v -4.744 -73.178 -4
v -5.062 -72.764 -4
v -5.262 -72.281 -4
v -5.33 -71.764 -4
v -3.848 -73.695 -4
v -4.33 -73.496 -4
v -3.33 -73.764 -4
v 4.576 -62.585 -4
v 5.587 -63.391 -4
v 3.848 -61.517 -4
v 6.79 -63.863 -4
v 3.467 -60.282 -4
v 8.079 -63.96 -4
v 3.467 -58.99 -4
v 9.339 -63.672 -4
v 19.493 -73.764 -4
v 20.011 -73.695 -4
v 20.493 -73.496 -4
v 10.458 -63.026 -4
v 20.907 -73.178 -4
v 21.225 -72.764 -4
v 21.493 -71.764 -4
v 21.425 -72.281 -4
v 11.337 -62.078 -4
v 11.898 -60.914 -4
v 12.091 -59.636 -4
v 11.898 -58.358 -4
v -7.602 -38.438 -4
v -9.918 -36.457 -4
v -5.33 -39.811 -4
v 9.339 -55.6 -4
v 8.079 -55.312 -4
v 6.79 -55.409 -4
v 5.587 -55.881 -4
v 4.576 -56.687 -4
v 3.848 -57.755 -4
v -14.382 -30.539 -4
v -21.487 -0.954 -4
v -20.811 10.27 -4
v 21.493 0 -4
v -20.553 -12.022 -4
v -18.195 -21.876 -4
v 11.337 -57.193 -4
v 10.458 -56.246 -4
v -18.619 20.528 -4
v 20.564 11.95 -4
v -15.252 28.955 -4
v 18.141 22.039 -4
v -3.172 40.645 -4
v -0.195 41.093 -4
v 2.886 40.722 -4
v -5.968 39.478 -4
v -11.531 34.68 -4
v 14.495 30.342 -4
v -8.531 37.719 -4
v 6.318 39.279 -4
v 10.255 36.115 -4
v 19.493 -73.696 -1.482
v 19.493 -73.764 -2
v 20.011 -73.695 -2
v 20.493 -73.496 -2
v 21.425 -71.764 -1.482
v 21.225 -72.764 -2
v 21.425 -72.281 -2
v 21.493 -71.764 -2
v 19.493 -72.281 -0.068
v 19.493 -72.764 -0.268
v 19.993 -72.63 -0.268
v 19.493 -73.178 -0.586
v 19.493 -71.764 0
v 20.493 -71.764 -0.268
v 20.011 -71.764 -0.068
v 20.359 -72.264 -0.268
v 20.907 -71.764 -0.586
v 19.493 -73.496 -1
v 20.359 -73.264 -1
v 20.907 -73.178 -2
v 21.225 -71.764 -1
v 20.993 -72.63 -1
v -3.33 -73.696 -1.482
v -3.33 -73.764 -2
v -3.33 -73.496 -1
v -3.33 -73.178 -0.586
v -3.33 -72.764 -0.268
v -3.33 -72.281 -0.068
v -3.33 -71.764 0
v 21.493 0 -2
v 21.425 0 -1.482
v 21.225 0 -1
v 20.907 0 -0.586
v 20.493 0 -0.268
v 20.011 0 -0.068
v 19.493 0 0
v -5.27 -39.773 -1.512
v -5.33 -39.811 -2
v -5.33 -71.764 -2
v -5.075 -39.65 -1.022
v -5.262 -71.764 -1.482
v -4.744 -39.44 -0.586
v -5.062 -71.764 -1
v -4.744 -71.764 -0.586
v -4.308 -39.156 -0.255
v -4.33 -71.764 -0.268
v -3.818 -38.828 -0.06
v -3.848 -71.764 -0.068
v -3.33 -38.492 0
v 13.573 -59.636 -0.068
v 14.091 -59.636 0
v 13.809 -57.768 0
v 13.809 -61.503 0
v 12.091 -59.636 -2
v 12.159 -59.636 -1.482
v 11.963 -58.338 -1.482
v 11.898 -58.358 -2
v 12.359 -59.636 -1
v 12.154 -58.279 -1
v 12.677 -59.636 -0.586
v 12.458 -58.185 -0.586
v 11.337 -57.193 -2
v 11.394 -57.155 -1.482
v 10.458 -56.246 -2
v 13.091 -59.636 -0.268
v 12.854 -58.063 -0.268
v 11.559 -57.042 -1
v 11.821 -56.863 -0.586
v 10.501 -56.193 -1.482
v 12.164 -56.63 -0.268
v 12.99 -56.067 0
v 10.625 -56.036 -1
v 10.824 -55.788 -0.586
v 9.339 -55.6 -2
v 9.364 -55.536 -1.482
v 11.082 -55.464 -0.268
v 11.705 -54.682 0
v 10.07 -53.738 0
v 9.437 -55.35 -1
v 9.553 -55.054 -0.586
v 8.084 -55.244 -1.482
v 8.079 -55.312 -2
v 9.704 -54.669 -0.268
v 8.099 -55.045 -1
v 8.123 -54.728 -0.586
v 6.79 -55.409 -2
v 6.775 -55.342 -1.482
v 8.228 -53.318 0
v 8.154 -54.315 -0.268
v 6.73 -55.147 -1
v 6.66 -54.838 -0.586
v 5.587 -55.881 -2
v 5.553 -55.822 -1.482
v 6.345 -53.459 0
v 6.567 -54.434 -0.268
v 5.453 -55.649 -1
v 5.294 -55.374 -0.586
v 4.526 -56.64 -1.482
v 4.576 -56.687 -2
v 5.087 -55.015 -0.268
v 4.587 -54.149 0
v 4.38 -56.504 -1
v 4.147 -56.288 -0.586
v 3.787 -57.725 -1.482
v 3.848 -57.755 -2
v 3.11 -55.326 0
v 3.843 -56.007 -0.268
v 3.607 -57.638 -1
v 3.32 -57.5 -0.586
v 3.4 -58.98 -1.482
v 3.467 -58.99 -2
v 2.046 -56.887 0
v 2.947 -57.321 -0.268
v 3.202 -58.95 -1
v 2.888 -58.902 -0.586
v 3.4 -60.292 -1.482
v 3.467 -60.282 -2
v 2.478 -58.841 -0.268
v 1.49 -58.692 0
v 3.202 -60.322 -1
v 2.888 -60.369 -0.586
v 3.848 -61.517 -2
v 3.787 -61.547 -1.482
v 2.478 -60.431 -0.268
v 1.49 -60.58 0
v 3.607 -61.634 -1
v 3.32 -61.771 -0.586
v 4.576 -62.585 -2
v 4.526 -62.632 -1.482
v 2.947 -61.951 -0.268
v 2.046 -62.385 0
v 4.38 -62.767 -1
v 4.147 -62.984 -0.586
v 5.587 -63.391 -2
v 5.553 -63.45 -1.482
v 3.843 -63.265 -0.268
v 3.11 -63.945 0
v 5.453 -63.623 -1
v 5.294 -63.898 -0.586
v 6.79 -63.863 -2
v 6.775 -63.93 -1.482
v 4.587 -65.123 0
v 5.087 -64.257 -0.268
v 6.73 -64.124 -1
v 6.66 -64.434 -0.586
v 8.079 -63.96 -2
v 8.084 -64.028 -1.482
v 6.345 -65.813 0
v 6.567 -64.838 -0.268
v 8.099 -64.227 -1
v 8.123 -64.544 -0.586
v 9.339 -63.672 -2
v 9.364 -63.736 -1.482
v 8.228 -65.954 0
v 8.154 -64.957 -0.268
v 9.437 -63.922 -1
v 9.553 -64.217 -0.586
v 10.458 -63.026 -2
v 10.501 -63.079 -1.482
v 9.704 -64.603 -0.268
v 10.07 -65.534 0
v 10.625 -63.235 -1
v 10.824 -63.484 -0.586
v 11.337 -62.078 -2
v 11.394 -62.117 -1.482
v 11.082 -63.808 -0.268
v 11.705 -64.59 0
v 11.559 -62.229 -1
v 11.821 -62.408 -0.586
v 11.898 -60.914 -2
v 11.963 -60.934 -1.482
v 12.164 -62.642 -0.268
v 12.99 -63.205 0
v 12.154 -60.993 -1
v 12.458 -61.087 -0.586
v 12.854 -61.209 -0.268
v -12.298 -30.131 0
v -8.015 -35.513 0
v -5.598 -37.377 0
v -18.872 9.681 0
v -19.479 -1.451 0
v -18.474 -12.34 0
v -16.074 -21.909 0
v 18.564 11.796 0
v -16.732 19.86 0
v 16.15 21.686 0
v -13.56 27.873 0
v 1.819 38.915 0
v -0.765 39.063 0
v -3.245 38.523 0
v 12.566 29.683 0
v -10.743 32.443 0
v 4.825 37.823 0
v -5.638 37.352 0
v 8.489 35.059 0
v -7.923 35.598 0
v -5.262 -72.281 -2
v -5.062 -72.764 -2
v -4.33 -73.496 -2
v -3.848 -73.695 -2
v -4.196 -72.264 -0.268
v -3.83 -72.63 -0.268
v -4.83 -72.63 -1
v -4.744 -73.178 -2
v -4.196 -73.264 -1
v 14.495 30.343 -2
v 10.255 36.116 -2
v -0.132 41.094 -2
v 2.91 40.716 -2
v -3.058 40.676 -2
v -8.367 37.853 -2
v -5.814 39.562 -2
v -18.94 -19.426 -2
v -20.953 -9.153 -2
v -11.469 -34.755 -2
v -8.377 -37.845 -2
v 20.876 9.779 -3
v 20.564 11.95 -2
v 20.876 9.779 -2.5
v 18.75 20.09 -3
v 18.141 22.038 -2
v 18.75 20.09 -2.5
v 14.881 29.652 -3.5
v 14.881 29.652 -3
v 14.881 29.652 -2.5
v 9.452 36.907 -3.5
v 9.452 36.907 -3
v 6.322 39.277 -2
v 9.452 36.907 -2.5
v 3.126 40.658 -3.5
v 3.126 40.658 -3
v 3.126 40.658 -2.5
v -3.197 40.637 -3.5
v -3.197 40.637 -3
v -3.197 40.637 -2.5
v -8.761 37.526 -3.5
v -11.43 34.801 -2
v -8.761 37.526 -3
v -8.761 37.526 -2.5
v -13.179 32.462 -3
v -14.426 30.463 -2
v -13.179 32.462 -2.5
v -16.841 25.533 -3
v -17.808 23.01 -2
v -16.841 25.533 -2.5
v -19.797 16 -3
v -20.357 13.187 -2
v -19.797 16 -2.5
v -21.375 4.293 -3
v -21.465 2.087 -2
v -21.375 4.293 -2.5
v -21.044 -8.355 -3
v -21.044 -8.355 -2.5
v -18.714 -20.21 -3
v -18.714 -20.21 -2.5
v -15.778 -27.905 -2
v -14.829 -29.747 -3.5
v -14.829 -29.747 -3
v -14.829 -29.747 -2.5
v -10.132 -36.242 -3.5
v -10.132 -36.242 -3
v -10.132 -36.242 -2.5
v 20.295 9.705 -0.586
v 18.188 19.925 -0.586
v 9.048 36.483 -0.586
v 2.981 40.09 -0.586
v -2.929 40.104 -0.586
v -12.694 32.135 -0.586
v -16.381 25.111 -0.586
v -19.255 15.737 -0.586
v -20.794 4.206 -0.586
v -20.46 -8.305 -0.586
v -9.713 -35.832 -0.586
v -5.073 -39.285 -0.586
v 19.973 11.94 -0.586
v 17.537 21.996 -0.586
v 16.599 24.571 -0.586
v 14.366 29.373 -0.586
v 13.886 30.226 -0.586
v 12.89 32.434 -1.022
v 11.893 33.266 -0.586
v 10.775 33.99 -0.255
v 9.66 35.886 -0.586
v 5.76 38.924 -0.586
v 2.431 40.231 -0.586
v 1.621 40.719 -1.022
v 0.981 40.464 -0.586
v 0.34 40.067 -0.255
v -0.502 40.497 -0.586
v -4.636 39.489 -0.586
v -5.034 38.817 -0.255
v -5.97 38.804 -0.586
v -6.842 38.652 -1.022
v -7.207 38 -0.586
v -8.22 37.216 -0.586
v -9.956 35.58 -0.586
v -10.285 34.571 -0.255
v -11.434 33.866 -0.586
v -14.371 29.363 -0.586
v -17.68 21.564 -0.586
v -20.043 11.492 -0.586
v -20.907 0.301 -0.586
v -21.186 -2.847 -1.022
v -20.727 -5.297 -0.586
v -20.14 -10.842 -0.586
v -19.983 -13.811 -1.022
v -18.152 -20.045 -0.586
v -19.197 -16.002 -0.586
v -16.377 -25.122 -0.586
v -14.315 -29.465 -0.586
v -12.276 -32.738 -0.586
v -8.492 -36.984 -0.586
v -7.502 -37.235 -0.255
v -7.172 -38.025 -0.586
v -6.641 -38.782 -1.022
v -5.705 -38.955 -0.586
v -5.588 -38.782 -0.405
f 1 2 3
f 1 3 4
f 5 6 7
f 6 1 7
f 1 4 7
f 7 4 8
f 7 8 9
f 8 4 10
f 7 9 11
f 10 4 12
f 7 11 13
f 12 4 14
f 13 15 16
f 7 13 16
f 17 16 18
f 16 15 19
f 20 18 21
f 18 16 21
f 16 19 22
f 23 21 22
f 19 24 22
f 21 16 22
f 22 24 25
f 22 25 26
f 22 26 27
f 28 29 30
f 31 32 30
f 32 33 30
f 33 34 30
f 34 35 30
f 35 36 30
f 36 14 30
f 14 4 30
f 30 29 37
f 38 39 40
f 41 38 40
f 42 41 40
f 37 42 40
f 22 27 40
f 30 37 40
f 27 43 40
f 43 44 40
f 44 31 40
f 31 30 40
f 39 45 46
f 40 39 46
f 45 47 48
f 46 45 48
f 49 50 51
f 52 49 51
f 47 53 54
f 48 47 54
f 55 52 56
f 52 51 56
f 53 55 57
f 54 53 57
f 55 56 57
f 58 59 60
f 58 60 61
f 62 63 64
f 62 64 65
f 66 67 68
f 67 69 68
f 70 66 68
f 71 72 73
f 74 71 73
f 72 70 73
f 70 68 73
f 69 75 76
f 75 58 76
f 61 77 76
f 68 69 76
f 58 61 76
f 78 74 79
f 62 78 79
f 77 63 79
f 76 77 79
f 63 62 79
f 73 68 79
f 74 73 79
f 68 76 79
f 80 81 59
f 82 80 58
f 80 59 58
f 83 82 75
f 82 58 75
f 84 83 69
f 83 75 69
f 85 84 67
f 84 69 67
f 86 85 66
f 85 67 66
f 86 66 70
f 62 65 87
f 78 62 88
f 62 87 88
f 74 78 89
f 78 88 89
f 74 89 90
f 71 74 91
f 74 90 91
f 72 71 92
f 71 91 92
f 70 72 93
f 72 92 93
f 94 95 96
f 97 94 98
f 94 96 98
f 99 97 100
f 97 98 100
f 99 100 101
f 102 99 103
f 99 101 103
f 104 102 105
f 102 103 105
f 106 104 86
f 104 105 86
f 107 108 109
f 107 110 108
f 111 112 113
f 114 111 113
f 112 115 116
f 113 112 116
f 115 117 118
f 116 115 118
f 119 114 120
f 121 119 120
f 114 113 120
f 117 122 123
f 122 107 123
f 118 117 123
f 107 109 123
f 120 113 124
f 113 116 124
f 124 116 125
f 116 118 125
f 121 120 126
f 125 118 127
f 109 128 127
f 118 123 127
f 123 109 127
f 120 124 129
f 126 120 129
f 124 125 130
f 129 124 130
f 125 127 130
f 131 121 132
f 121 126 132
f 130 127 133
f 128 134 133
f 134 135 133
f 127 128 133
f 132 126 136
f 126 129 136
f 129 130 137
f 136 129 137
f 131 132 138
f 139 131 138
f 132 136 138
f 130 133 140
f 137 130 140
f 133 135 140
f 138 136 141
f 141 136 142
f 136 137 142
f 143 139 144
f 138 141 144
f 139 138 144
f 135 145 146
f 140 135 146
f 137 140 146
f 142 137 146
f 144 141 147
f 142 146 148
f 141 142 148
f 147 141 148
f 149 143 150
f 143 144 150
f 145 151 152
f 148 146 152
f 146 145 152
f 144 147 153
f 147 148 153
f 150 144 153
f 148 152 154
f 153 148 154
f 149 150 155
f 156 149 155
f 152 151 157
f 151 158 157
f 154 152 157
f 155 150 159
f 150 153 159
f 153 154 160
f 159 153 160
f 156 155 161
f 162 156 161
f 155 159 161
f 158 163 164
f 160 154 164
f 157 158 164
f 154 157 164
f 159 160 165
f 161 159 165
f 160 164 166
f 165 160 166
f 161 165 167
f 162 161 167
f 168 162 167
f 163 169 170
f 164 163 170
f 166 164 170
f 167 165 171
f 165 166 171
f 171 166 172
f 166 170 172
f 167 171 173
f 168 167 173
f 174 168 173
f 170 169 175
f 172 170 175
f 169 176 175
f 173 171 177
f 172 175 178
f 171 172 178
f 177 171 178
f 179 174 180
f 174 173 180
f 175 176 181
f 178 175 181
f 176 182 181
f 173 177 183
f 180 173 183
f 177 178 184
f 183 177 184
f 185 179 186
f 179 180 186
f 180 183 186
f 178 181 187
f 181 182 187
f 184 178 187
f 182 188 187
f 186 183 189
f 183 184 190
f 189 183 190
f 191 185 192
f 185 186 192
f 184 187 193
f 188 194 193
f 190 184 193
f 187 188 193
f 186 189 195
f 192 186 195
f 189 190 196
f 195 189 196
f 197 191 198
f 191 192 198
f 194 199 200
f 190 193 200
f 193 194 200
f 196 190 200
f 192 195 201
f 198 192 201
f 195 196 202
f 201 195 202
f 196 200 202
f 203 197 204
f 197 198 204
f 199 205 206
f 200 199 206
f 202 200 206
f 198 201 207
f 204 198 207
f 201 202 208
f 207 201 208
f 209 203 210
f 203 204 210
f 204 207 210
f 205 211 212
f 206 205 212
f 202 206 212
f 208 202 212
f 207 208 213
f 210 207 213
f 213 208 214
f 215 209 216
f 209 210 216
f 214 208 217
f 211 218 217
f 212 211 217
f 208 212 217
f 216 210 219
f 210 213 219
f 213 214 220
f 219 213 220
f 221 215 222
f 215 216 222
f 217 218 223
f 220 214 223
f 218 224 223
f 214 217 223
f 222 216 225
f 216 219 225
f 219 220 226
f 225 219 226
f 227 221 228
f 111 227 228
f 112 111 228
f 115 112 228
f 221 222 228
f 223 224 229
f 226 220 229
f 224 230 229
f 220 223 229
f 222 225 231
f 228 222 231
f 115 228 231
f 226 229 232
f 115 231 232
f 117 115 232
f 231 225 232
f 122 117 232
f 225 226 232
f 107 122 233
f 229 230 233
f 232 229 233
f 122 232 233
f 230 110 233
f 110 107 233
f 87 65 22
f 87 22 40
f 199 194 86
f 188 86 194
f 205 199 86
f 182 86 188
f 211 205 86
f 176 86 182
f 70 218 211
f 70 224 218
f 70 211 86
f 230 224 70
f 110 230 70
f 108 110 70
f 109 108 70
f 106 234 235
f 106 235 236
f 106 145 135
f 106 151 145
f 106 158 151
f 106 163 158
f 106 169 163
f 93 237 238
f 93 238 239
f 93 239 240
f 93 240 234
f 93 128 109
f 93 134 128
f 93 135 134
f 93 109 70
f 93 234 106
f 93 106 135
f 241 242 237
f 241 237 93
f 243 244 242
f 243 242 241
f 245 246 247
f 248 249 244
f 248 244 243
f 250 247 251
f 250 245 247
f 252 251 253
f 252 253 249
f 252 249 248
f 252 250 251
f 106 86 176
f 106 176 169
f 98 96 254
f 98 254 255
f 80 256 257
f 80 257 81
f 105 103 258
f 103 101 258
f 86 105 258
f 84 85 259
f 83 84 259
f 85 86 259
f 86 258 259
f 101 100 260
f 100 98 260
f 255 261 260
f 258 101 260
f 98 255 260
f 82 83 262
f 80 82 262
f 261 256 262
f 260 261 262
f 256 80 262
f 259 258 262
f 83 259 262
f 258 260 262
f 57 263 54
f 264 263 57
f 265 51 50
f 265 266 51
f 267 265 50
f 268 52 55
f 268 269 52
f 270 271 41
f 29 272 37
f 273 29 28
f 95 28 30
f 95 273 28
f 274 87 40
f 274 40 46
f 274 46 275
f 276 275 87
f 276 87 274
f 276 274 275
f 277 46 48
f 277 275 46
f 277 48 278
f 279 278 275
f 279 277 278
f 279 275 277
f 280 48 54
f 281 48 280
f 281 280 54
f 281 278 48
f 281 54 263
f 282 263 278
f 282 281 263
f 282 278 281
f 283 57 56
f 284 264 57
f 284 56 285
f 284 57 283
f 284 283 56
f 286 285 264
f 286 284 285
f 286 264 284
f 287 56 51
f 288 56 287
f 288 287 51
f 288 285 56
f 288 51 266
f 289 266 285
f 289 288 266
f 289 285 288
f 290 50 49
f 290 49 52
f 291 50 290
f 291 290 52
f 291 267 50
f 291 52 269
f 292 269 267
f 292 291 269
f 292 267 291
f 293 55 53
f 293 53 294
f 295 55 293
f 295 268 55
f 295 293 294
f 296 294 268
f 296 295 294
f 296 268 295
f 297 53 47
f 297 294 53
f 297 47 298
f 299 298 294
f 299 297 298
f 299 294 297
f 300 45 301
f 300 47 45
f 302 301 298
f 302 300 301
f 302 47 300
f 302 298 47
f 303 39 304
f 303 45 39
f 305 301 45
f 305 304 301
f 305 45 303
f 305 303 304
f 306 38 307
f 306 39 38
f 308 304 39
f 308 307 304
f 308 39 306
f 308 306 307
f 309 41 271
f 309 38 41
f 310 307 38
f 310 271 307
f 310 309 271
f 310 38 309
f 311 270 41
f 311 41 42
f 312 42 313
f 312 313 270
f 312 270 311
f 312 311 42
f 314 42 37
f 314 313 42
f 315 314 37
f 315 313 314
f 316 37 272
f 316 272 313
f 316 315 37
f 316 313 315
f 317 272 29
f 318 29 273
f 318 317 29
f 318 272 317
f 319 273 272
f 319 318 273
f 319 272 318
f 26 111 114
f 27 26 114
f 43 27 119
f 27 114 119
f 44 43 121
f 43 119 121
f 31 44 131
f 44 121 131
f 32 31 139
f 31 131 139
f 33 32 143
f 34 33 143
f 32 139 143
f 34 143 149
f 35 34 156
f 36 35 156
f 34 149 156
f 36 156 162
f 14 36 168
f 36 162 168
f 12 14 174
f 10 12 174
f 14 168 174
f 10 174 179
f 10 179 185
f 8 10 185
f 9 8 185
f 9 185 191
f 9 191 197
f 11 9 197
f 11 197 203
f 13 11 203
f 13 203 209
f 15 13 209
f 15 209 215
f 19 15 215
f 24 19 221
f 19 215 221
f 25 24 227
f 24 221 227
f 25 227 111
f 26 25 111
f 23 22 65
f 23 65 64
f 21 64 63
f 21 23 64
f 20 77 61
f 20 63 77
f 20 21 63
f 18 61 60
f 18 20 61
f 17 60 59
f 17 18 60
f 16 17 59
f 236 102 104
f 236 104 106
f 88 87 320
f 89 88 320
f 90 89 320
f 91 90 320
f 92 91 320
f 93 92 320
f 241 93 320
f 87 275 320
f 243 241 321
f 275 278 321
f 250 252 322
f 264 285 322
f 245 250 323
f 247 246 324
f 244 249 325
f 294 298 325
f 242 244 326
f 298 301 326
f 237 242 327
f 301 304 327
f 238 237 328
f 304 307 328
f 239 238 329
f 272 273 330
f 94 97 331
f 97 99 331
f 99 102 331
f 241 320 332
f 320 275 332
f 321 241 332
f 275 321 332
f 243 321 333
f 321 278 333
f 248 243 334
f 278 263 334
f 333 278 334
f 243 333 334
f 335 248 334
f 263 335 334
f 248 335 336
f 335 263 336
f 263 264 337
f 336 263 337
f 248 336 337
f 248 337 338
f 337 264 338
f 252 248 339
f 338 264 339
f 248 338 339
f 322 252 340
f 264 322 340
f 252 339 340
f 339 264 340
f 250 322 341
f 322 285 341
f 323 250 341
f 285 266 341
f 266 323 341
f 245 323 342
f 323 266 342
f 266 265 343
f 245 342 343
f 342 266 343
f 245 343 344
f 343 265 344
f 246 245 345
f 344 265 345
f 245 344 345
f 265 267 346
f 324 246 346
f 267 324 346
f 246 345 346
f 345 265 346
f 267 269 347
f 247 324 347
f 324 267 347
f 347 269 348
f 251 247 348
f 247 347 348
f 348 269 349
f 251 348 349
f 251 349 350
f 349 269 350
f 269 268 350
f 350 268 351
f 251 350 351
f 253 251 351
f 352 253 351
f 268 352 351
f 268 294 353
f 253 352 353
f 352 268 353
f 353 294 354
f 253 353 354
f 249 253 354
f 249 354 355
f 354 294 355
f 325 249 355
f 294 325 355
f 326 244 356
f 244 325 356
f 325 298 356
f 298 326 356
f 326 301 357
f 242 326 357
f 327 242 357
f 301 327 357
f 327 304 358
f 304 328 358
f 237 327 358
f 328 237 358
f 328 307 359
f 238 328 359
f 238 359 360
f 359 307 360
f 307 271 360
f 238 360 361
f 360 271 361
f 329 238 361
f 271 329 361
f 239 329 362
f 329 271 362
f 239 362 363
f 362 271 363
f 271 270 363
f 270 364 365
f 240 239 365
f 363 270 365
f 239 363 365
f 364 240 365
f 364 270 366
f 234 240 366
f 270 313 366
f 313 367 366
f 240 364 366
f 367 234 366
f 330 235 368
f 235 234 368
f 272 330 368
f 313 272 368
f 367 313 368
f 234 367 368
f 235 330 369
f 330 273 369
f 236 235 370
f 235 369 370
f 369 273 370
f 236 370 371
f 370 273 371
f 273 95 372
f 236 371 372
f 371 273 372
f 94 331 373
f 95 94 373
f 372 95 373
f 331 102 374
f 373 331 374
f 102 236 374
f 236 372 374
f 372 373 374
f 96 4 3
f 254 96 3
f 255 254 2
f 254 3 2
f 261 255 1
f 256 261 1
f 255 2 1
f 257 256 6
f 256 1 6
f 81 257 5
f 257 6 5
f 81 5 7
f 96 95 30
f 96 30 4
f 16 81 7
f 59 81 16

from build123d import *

# Parameters (mm, degrees)
F0_R        = 4.336036498
F1_DEPTH    = 4
F2_R        = 1.9999
F3_T1_DEPTH = 9
F3_T4_ANGLE = 90
F3_T6_ANGLE = 90


# Not quite as in the source:
# - a fillet or chamfer that OpenCascade refuses, or shapes differently, is made with other operations: its cross-section is extruded or revolved along the edge and cut away or added
# - a fillet or chamfer is up to 0.001 mm smaller than in the source, because OpenCascade refuses the exact size


with BuildPart() as f1:
    # F0 (on Top) → F1 (new body)
    with BuildSketch(Plane.XY):
        with BuildLine():
            add(Edge.make_bspline(
                [(-5.3302422166, -39.8106665894), (-2.7074100905, -41.0944335163), (0, -41.0944335163)],
                knots=[6.0325722383, 6.0325722383, 6.0325722383, 6.2831853072, 6.2831853072, 6.2831853072], degree=2, weights=[1, 0.9921594035, 1]))
            add(Edge.make_bspline(
                [(0, -41.0944335163), (21.4930921895, -41.0944335163), (21.4930921895, 0)],
                knots=[0, 0, 0, 1.5707963268, 1.5707963268, 1.5707963268], degree=2, weights=[1, 0.7071067812, 1]))
            add(Edge.make_bspline(
                [(21.4930921895, 0), (21.4930921895, 83.9221072153), (-13.1793327698, 32.4619744443), (-47.8517577291, -18.9981583267), (-5.3302422166, -39.8106665894)],
                knots=[1.5707963268, 1.5707963268, 1.5707963268, 3.8016842826, 3.8016842826, 6.0325722383, 6.0325722383, 6.0325722383], degree=2, weights=[1, 0.4397787878, 1, 0.4397787878, 1]))
        make_face()
        with BuildLine():
            add(Edge.make_bspline(
                [(0, -41.0944335163), (21.4930921895, -41.0944335163), (21.4930921895, 0)],
                knots=[0, 0, 0, 1.5707963268, 1.5707963268, 1.5707963268], degree=2, weights=[1, 0.7071067812, 1]))
            add(Edge.make_bspline(
                [(-5.3302422166, -39.8106665894), (-2.7074100905, -41.0944335163), (0, -41.0944335163)],
                knots=[6.0325722383, 6.0325722383, 6.0325722383, 6.2831853072, 6.2831853072, 6.2831853072], degree=2, weights=[1, 0.9921594035, 1]))
            Line((-5.3302422166, -39.8106665894), (-5.3302422166, -73.7636461854))
            Line((-5.3302422166, -73.7636461854), (21.4930921895, -73.7636461854))
            Line((21.4930921895, -73.7636461854), (21.4930921895, 0))
        make_face()
        with Locations((7.7548543923, -59.6359223127)):
            Circle(F0_R, mode=Mode.SUBTRACT)
    extrude(amount=-F1_DEPTH)

    # F2 (radius 2 in the source; OpenCascade refuses exactly that, so slightly less here)
    f2_edges = [f1.edges().sort_by_distance(p)[0] for p in [
        (-16.104761, 27.214024, 0),
        (-5.330242, -56.787156, 0),
        (8.081425, -73.763646, 0),
        (21.493092, -36.881823, 0),
        (3.418818, -59.635922, 0),
    ]]
    fillet(f2_edges, radius=F2_R)

    # F3: fillet of radius 2 on 2 edges, made by hand

    # F3_s2 → F3_t1 (cut)
    with BuildSketch(Plane.XY.offset(-9)):
        with BuildLine():
            ThreePointArc((21.4930921895, -71.7636461854), (20.9073057519, -73.1778597478), (19.4930921895, -73.7636461854))
            Line((19.4930921895, -73.7636461854), (21.4930921895, -73.7636461854))
            Line((21.4930921895, -73.7636461854), (21.4930921895, -71.7636461854))
        make_face()
        with BuildLine():
            ThreePointArc((-5.3302422166, -71.7636461854), (-4.744455779, -73.1778597478), (-3.3302422166, -73.7636461854))
            Line((-3.3302422166, -73.7636461854), (-5.3302422166, -73.7636461854))
            Line((-5.3302422166, -73.7636461854), (-5.3302422166, -71.7636461854))
        make_face()
    extrude(amount=F3_T1_DEPTH, mode=Mode.SUBTRACT)

    # F3_s3 → F3_t4 (revolve, cut)
    with BuildSketch(Plane.XZ.offset(71.7636461854)):
        with BuildLine():
            ThreePointArc((-3.3303422166, 0), (-4.7444850683, -0.5857571483), (-5.3302422166, -1.9999))
            Line((-5.3302422166, -1.9999), (-5.3302422166, 0))
            Line((-5.3302422166, 0), (-3.3303422166, 0))
        make_face()
    revolve(axis=Axis((-3.3302422166, -71.7636461854, 0), (0, 0, 1)), revolution_arc=F3_T4_ANGLE, mode=Mode.SUBTRACT)

    # F3_s5 → F3_t6 (revolve, cut)
    with BuildSketch(Plane.YZ.offset(19.4930921895)):
        with BuildLine():
            ThreePointArc((-71.7637461854, 0), (-73.1778890371, -0.5857571483), (-73.7636461854, -1.9999))
            Line((-73.7636461854, -1.9999), (-73.7636461854, 0))
            Line((-73.7636461854, 0), (-71.7637461854, 0))
        make_face()
    revolve(axis=Axis((19.4930921895, -71.7636461854, 0), (0, 0, 1)), revolution_arc=F3_T6_ANGLE, mode=Mode.SUBTRACT)


solid = f1.part
